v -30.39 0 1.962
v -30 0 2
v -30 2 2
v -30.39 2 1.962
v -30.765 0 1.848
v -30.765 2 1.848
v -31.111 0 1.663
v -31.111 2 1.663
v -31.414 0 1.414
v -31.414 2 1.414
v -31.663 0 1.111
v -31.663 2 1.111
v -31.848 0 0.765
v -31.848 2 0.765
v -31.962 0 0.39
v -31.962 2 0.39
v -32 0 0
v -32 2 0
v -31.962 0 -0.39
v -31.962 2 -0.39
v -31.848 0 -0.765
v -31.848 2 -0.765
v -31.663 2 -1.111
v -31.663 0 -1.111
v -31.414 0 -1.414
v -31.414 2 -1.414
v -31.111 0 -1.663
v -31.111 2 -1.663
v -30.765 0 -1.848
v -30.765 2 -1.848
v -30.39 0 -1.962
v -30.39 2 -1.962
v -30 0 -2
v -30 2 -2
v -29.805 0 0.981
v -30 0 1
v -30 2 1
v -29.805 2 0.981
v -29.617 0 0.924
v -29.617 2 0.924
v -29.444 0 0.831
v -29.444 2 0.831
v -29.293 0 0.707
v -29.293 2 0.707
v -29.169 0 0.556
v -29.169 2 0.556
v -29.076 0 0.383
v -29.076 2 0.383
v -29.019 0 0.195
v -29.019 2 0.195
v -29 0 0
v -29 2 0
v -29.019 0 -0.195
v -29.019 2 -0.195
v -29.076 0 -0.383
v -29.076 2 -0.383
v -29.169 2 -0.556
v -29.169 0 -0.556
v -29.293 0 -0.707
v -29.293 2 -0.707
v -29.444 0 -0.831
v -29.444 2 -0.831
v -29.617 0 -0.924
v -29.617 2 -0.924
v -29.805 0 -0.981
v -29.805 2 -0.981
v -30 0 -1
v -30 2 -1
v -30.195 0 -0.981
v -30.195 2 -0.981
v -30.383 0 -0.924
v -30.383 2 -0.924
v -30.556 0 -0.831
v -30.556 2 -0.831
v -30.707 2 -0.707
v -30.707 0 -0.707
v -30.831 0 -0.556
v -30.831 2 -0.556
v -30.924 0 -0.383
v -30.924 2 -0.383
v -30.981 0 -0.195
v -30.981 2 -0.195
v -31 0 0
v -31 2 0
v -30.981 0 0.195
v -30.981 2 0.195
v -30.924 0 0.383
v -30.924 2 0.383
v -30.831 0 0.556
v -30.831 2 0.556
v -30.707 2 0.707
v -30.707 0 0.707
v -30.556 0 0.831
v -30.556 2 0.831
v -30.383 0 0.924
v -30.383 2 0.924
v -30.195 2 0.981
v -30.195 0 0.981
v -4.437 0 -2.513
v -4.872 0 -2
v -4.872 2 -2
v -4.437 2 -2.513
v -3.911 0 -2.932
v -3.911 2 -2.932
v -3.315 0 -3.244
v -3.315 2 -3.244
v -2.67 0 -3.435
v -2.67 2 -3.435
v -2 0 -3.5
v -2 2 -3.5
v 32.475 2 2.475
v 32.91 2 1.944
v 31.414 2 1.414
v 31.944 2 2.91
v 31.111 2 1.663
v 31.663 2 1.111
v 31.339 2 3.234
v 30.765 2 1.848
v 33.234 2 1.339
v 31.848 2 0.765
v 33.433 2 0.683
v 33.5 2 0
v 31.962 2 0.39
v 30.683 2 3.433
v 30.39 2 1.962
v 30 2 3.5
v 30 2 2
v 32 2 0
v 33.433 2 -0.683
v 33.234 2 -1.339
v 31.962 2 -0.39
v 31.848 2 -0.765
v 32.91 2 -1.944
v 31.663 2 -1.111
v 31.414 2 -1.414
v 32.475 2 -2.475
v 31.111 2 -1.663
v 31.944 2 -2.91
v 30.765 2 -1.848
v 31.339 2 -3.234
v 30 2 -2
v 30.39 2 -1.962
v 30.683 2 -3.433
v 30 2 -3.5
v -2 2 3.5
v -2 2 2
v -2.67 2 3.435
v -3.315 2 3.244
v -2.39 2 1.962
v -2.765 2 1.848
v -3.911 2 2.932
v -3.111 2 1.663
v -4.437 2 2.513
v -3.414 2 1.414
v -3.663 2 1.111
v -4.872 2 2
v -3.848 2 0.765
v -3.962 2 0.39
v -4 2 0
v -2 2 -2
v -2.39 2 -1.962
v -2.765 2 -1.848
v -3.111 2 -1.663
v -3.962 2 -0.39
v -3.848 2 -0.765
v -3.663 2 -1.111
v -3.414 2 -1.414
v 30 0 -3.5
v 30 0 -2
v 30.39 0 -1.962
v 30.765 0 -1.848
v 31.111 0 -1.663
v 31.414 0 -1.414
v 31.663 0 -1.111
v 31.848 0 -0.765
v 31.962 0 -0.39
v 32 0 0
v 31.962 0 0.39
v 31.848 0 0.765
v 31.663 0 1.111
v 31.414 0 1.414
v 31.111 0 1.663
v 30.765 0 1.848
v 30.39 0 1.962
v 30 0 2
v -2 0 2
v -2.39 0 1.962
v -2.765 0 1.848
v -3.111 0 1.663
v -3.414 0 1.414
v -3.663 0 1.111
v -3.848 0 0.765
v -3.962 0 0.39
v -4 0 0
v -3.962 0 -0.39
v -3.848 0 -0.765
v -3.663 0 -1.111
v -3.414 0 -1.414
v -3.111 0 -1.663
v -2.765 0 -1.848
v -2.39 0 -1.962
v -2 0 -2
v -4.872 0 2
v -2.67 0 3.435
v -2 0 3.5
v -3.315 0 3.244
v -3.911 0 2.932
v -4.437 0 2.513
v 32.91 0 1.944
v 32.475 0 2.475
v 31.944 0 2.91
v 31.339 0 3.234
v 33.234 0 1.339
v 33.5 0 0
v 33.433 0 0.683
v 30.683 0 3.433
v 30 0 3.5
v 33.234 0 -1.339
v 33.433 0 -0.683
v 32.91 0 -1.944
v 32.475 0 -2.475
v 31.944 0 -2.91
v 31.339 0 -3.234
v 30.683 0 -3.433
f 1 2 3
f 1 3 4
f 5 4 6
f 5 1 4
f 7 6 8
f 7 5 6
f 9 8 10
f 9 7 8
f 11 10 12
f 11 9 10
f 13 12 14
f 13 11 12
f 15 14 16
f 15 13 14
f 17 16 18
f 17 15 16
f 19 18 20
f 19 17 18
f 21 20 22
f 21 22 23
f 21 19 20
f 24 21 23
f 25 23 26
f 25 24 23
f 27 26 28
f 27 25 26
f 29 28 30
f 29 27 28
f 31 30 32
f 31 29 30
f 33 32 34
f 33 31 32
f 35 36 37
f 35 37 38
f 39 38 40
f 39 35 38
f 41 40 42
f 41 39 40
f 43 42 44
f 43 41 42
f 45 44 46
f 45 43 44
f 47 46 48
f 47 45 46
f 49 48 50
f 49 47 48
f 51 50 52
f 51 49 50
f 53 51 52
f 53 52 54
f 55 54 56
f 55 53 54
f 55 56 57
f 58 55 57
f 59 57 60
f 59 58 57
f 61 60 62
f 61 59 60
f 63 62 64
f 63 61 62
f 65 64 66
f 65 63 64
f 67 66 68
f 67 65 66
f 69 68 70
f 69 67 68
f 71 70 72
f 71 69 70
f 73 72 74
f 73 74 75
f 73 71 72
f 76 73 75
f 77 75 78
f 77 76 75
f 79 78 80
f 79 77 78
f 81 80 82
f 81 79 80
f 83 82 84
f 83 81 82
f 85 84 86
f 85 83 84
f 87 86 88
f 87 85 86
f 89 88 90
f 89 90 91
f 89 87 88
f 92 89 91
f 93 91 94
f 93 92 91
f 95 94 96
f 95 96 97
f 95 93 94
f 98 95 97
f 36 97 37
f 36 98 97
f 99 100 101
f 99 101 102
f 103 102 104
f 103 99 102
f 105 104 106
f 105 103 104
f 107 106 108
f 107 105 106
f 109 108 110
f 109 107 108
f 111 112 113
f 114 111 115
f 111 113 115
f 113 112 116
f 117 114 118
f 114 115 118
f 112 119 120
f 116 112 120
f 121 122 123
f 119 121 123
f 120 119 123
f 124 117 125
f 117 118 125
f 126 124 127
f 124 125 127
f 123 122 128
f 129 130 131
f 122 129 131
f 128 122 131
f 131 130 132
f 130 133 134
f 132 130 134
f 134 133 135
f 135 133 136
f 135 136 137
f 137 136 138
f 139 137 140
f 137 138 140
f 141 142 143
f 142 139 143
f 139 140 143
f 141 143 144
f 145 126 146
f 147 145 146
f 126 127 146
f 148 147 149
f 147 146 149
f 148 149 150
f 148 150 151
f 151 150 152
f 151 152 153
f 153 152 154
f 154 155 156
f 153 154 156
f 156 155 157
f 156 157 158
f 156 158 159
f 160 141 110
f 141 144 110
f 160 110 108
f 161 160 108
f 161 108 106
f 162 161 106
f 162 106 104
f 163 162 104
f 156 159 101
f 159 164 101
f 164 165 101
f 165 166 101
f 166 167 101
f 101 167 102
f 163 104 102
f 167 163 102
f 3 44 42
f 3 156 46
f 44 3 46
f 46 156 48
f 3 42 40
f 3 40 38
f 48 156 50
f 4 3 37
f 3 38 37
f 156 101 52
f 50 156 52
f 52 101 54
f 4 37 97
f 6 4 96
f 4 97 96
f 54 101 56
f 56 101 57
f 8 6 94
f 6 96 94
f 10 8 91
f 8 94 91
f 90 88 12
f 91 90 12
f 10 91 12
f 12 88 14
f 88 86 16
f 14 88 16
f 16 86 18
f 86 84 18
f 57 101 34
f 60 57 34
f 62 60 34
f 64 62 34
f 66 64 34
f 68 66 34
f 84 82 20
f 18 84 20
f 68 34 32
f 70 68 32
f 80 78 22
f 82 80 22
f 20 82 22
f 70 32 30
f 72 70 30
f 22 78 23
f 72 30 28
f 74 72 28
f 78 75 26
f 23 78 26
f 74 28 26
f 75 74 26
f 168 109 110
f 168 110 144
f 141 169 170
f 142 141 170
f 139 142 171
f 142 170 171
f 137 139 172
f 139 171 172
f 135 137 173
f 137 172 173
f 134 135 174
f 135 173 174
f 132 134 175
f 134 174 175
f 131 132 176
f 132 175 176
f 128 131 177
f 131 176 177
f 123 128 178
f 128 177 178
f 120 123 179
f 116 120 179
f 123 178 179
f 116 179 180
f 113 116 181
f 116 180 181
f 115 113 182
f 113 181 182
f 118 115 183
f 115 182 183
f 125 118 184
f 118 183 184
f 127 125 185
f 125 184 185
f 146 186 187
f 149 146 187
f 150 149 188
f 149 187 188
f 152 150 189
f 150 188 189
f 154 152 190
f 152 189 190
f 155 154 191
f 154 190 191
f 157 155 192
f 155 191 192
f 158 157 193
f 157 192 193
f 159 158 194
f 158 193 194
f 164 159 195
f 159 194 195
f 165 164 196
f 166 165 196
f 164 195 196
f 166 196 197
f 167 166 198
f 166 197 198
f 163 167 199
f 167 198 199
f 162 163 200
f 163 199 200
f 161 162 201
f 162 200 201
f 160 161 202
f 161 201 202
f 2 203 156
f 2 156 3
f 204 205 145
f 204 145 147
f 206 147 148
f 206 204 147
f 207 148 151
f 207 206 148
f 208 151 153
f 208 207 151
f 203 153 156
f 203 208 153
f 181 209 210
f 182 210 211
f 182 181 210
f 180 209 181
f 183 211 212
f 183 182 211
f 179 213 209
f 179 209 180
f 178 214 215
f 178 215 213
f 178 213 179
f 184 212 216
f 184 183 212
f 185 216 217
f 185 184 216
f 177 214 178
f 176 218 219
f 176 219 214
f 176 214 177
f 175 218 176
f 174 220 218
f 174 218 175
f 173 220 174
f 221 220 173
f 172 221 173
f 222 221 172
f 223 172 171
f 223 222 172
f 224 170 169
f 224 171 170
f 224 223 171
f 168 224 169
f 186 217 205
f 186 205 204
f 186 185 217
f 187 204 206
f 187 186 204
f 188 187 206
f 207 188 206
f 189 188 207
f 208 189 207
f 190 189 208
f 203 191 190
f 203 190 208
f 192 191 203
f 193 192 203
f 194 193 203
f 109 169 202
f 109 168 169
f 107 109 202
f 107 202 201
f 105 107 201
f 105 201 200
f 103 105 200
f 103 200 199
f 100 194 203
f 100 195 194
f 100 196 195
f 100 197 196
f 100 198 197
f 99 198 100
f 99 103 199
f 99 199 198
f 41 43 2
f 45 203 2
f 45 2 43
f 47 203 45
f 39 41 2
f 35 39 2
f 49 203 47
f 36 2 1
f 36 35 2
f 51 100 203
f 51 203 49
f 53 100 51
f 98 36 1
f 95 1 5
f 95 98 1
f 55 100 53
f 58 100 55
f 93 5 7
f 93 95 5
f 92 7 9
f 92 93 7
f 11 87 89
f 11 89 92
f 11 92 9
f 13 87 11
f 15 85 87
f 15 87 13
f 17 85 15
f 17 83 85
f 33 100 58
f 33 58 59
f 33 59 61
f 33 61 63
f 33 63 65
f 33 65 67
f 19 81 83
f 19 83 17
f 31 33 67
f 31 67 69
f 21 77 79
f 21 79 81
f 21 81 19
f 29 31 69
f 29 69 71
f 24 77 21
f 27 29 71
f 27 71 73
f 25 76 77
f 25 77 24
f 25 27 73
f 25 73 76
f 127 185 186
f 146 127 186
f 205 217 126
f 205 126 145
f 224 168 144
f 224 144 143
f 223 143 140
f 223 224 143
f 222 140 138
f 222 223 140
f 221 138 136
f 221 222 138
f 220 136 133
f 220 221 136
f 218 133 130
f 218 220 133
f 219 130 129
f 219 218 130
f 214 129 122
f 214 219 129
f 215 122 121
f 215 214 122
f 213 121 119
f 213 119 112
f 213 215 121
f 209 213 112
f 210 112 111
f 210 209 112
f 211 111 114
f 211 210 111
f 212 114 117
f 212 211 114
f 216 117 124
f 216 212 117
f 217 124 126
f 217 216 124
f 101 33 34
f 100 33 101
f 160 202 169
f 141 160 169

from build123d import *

# Parameters (mm, degrees)
SKETCH_1_R      = 1
EXTRUDE_1_DEPTH = 2


with BuildPart() as part:
    # 草图1 → 凸台-拉伸1 (new body)
    with BuildSketch(Plane(origin=(0, 0, 0), x_dir=(1, 0, 0), z_dir=(0, 1, 0))):
        with BuildLine():
            Line((-30, 2), (-4.872281323, 2))
            ThreePointArc((-4.872281323, 2), (-3.620185175, 3.102418411), (-2, 3.5))
            Line((-2, 3.5), (30, 3.5))
            ThreePointArc((30, 3.5), (33.5, 0), (30, -3.5))
            Line((30, -3.5), (-2, -3.5))
            ThreePointArc((-2, -3.5), (-3.620185175, -3.102418411), (-4.872281323, -2))
            Line((-4.872281323, -2), (-30, -2))
            ThreePointArc((-30, -2), (-32, 0), (-30, 2))
        make_face()
        with Locations(Location((-30, 0, 0), (0, 0, 270))):
            Circle(SKETCH_1_R, mode=Mode.SUBTRACT)
        with BuildLine():
            Line((-2, 2), (30, 2))
            ThreePointArc((30, 2), (32, 0), (30, -2))
            Line((30, -2), (-2, -2))
            ThreePointArc((-2, -2), (-4, 0), (-2, 2))
        make_face(mode=Mode.SUBTRACT)
    extrude(amount=EXTRUDE_1_DEPTH)


solid = part.part
